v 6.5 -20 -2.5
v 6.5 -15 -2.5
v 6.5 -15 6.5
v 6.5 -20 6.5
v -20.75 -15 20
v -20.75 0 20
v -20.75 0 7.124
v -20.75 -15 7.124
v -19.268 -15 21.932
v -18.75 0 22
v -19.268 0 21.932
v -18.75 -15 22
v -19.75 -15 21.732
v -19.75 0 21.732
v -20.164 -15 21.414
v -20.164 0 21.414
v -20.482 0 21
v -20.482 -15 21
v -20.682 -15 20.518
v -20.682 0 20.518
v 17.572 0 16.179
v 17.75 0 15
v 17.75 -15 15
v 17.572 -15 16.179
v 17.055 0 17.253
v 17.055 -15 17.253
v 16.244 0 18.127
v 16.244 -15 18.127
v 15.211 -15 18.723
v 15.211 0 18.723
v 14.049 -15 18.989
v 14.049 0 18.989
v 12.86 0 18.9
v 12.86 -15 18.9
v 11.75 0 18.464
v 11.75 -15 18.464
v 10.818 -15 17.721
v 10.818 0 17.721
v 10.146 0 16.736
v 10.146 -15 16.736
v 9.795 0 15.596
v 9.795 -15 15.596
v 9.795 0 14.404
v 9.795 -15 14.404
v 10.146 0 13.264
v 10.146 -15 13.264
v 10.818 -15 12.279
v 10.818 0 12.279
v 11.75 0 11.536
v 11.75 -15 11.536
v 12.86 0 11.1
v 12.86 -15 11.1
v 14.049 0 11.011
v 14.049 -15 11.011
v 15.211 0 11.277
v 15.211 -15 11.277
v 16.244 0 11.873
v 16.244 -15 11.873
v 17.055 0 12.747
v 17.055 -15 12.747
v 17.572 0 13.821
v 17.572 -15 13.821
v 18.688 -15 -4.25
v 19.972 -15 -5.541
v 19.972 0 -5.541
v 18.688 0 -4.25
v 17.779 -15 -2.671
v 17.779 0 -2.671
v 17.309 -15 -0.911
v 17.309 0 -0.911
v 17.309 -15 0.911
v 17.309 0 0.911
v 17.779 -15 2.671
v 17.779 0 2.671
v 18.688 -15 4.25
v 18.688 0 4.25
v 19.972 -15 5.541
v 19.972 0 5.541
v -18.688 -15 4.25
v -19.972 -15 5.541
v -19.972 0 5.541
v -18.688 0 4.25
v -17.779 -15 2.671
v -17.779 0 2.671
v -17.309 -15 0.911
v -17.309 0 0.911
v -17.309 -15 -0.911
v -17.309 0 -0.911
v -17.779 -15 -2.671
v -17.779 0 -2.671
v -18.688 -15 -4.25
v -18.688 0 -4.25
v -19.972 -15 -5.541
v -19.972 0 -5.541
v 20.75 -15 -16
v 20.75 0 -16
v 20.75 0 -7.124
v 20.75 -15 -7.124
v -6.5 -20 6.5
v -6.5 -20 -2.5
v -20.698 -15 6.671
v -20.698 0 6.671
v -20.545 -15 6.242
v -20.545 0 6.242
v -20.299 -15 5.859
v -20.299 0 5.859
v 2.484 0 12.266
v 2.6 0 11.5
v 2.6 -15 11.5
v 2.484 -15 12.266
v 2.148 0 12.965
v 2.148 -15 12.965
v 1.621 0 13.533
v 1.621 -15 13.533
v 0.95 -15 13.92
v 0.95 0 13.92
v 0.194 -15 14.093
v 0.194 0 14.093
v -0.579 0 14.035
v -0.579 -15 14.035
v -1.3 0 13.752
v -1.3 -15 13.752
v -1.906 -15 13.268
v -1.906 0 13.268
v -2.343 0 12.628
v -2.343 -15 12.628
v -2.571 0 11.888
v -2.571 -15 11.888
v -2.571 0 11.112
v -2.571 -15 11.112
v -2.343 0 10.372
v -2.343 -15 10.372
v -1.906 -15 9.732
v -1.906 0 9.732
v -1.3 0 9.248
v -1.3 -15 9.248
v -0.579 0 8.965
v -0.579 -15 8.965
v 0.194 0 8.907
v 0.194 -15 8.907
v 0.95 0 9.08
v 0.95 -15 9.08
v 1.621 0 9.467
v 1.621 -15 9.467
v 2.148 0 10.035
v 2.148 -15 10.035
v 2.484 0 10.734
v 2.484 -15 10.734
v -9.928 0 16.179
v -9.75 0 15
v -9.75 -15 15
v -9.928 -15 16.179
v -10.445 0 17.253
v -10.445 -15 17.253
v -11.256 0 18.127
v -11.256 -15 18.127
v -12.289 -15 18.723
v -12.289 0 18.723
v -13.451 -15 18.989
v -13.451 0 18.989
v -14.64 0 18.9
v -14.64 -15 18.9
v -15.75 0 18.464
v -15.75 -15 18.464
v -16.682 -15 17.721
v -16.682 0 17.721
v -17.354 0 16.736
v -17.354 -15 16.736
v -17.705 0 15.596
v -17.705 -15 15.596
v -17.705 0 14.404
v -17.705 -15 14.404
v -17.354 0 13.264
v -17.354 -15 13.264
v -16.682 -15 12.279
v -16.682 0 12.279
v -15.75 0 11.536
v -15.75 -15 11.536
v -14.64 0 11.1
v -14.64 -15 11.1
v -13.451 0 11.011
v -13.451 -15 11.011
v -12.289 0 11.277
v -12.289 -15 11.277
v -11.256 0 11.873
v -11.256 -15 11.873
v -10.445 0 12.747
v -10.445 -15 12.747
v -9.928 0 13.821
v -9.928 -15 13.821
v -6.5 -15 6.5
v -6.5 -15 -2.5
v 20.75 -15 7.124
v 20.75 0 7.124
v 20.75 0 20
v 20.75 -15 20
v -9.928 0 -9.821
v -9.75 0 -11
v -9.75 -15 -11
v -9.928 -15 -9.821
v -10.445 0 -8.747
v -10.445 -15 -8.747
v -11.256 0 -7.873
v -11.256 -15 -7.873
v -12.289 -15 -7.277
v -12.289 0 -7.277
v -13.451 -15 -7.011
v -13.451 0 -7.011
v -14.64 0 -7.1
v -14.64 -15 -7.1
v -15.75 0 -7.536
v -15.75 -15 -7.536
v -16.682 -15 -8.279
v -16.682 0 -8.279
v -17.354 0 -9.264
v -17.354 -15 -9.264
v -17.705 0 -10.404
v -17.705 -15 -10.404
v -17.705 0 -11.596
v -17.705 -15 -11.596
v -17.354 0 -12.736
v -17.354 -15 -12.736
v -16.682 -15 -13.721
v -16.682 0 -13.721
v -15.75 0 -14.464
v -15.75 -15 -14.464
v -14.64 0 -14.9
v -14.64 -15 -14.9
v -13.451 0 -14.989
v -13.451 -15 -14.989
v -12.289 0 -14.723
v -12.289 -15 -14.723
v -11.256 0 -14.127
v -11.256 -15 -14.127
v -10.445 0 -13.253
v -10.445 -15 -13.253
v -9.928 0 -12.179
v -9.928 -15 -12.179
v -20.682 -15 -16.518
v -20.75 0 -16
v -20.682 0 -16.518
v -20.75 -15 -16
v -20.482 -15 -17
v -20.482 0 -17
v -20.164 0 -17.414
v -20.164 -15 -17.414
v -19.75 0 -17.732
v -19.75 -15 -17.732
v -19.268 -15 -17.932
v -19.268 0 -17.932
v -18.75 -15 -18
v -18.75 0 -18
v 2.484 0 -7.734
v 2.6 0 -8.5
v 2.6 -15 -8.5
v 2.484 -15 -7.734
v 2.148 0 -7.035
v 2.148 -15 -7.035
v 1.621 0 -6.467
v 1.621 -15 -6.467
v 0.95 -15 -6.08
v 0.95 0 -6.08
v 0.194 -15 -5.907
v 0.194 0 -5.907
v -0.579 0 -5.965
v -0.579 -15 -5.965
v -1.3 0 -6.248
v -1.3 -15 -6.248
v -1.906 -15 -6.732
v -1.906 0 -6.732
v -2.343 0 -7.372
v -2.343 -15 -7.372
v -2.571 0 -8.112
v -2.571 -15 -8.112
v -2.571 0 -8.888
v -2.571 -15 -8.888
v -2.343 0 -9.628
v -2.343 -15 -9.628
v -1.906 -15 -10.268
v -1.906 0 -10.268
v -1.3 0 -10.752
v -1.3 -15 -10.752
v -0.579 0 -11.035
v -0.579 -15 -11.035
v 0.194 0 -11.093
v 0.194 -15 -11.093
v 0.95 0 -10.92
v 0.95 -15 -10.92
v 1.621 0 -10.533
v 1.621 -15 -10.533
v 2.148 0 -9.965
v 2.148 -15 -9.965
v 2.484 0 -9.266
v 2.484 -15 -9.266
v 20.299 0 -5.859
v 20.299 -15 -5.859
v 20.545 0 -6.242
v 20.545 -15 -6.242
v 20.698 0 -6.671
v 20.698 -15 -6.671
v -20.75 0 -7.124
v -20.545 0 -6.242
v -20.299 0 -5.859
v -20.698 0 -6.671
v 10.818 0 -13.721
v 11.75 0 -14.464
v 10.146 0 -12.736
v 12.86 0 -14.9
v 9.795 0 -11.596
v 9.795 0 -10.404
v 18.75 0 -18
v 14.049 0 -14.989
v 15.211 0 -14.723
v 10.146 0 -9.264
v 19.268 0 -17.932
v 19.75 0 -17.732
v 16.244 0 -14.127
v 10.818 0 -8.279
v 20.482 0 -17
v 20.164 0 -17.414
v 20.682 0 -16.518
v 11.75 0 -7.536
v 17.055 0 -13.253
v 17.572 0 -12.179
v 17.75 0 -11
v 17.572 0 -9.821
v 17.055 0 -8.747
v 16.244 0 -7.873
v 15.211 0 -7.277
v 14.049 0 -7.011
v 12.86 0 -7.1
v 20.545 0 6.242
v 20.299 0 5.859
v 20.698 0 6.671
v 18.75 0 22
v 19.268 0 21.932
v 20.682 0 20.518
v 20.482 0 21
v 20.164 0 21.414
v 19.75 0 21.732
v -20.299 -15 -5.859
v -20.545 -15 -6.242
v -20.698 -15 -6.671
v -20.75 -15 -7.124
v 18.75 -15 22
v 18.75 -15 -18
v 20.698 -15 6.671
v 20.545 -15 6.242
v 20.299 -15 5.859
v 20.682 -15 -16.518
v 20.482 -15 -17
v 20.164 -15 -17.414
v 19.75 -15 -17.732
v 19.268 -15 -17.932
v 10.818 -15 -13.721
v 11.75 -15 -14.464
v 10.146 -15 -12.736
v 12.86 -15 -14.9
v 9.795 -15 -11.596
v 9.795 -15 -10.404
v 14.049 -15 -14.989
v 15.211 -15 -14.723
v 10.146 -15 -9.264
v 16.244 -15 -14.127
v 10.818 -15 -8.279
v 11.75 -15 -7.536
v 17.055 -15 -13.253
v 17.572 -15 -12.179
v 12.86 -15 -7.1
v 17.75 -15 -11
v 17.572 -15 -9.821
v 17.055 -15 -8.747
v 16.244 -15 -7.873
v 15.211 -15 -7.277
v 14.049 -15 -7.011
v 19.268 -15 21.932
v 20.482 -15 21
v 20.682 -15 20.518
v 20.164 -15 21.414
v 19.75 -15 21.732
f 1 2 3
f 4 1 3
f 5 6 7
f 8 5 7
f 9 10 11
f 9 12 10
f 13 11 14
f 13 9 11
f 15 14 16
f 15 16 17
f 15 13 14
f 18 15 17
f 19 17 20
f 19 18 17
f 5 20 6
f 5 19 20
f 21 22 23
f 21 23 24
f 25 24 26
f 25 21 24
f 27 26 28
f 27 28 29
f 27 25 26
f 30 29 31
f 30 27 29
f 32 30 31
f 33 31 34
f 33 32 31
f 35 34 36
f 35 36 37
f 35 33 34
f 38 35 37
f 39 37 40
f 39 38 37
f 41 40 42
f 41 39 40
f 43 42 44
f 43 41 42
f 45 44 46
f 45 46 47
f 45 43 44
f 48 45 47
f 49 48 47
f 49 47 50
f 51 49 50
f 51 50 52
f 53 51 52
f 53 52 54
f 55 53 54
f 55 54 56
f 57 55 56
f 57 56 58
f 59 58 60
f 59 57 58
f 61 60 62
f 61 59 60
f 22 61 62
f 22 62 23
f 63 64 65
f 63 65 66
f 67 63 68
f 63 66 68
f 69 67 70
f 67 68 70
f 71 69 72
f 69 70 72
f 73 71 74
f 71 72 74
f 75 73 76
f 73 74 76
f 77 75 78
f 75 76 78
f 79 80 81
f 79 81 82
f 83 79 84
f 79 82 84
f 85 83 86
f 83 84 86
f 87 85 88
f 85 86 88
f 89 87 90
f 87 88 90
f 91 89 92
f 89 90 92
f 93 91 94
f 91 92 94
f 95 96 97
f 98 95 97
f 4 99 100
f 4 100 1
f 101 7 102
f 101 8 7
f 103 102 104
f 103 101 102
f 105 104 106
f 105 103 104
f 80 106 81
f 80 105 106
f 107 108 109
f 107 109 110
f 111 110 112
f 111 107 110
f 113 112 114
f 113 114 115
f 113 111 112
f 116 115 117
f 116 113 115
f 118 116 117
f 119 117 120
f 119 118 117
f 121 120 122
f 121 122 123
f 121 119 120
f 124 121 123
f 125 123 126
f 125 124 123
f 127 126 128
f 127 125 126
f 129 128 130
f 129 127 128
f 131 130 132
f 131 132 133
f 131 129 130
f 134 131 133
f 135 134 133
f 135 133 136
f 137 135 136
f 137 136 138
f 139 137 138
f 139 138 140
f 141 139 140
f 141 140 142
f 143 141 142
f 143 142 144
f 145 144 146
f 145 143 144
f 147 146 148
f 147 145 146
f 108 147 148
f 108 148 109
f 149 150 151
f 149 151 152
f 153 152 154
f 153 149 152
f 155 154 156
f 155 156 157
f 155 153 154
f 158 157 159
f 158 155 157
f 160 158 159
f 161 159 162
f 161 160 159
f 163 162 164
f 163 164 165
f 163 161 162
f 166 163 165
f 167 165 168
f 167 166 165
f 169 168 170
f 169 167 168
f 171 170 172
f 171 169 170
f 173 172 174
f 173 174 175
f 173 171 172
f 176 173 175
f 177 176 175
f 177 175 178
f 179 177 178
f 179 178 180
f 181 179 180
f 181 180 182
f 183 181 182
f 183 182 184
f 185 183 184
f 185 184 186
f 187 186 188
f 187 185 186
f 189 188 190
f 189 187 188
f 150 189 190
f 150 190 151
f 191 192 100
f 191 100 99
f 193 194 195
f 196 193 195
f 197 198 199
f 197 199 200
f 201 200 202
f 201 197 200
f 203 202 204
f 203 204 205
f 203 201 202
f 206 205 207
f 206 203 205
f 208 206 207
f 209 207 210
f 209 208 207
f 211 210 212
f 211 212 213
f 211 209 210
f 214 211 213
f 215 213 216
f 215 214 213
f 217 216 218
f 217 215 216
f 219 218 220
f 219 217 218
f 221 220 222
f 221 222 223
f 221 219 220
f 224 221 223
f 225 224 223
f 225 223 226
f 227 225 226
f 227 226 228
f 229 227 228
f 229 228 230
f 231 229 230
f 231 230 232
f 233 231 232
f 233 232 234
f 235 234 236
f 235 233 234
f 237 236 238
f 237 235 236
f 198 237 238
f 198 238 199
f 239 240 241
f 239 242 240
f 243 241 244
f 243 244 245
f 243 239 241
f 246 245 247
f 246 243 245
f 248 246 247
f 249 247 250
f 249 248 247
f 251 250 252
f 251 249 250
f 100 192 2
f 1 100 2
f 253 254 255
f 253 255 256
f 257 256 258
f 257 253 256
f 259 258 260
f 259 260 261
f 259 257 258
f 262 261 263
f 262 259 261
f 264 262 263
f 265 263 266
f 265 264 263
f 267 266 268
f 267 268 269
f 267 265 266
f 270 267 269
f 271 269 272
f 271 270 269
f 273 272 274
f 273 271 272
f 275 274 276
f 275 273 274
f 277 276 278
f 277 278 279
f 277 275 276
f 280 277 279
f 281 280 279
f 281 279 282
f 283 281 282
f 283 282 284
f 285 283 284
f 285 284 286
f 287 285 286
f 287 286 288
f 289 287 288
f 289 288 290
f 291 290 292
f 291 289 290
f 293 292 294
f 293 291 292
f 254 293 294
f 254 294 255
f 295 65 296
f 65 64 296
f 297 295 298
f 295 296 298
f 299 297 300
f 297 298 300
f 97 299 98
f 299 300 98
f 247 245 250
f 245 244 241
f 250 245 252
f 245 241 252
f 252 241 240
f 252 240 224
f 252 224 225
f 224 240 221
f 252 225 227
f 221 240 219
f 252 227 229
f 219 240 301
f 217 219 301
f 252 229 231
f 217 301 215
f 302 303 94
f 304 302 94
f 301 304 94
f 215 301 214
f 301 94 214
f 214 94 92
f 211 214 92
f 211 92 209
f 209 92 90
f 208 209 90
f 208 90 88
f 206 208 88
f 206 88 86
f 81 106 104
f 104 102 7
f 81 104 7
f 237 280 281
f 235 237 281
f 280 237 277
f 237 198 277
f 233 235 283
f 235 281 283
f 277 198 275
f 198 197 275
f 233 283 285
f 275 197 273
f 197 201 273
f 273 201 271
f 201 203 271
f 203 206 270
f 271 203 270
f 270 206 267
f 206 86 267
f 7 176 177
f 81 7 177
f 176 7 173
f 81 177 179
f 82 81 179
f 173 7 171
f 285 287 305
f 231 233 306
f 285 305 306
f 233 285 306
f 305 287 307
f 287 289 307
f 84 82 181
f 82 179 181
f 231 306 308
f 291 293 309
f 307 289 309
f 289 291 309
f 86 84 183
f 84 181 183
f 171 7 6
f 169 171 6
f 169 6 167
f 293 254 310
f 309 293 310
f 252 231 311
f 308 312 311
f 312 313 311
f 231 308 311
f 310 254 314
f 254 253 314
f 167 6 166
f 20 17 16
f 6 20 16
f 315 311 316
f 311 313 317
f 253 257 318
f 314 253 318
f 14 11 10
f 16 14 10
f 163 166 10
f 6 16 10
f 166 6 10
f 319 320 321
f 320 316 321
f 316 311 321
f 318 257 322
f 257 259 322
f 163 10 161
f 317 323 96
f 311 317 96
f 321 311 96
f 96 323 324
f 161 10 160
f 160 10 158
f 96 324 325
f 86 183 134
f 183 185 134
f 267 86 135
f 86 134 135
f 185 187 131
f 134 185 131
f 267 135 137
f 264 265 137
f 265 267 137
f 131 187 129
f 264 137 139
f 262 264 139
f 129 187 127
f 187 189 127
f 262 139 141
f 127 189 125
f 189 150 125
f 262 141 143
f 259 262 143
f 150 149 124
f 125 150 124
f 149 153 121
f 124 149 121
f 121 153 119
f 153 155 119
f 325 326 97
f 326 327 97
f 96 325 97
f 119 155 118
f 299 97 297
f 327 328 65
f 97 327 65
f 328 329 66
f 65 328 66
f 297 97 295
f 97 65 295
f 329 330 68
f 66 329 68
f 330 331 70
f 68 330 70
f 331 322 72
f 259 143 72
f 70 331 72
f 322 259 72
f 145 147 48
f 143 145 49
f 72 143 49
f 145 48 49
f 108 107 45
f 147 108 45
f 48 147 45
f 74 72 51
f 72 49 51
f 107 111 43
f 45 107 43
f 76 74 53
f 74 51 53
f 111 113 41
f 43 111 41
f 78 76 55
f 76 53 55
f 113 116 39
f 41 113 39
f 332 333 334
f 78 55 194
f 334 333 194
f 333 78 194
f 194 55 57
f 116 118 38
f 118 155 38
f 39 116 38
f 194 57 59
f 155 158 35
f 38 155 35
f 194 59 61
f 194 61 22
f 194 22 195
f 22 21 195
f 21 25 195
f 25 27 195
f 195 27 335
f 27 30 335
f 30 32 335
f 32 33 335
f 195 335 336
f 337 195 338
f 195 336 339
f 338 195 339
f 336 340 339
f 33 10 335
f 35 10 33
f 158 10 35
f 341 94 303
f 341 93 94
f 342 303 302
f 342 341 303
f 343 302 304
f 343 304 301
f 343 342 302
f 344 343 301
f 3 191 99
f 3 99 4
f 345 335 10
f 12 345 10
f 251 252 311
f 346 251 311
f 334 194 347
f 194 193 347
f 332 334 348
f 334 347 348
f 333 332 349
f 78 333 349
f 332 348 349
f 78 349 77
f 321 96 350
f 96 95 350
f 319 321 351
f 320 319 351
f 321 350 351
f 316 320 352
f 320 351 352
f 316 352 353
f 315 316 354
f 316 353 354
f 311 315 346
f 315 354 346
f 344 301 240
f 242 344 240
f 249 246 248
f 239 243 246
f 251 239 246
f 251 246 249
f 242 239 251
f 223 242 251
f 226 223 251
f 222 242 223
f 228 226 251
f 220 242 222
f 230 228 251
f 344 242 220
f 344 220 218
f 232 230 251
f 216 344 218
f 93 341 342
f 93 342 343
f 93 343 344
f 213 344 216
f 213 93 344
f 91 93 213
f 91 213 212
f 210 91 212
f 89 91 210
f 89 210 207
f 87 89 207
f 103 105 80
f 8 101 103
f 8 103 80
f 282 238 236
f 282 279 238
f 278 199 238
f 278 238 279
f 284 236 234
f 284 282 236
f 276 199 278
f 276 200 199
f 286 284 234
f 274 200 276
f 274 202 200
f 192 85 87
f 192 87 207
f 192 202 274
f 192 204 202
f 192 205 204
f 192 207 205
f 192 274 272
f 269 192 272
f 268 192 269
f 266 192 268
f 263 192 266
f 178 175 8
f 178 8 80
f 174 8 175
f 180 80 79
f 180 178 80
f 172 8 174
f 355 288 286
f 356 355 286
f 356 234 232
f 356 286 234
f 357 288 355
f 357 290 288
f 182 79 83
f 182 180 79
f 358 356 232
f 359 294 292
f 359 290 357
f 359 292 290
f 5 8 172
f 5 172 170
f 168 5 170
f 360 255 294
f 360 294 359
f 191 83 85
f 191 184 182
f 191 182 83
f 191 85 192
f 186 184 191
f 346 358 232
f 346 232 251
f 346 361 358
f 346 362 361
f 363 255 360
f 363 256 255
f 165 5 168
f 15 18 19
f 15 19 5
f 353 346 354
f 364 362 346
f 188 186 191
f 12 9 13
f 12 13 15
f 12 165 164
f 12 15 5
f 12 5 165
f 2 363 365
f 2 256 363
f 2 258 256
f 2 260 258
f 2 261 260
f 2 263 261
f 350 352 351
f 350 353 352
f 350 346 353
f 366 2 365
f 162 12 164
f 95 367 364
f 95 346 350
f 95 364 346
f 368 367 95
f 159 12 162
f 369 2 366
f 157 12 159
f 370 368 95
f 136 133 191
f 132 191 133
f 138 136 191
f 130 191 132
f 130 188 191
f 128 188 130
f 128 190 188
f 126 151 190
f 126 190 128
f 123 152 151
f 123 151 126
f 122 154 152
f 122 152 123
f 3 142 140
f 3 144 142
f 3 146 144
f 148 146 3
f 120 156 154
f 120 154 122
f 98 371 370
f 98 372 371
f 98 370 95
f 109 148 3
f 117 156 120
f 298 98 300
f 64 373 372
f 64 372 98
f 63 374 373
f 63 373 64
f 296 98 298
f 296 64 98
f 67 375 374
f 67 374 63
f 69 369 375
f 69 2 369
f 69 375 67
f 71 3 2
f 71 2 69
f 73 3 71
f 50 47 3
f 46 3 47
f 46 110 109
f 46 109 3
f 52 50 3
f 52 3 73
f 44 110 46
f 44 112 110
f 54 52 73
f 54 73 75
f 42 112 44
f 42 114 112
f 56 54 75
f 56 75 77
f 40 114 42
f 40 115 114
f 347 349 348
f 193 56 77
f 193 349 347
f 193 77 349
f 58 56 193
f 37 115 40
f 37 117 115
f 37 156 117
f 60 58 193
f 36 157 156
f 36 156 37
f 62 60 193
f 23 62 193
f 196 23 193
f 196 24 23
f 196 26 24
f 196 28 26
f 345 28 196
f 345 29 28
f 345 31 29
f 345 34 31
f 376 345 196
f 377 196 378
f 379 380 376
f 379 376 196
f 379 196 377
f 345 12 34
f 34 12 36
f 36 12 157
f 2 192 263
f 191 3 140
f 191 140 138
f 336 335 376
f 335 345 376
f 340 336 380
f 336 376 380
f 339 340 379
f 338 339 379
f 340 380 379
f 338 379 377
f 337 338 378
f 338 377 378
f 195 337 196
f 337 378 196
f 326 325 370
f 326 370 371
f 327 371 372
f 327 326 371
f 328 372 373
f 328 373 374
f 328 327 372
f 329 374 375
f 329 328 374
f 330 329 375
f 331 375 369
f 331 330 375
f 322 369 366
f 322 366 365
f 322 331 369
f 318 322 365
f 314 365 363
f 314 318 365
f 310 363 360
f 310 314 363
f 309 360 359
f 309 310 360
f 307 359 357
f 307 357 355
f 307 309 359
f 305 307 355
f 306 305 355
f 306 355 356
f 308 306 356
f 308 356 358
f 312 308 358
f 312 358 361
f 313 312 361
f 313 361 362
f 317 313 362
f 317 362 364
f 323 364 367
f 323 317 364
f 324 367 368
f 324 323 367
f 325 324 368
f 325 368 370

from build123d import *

# Parameters (mm, degrees)
F0_R     = 4
F0_R_2   = 2.6
F1_DEPTH = 15
F2_R     = 2
F3_W     = 13
F3_H     = 9
F4_DEPTH = 5


with BuildPart() as f1:
    # F0 (on Front) → F1 (new body)
    with BuildSketch(Plane.XZ):
        with BuildLine():
            Line((20.75, 22), (-20.75, 22))
            Line((-20.75, 22), (-20.75, 6.062178))
            ThreePointArc((-20.75, 6.062178), (-17.25, 0), (-20.75, -6.062178))
            Line((-20.75, -6.062178), (-20.75, -18))
            Line((-20.75, -18), (20.75, -18))
            Line((20.75, -18), (20.75, -6.062178))
            ThreePointArc((20.75, -6.062178), (17.25, 0), (20.75, 6.062178))
            Line((20.75, 6.062178), (20.75, 22))
        make_face()
        with Locations((-13.75, -11)):
            Circle(F0_R, mode=Mode.SUBTRACT)
        with Locations((0, -8.5)):
            Circle(F0_R_2, mode=Mode.SUBTRACT)
        with Locations((13.75, -11)):
            Circle(F0_R, mode=Mode.SUBTRACT)
        with Locations((-13.75, 15)):
            Circle(F0_R, mode=Mode.SUBTRACT)
        with Locations((0, 11.5)):
            Circle(F0_R_2, mode=Mode.SUBTRACT)
        with Locations((13.75, 15)):
            Circle(F0_R, mode=Mode.SUBTRACT)
    extrude(amount=F1_DEPTH)

    # F2
    f2_edges = [f1.edges().sort_by_distance(p)[0] for p in [
        (-20.75, -7.5, 22),
        (20.75, -7.5, 22),
        (-20.75, -7.5, -18),
        (20.75, -7.5, -18),
        (20.75, -7.5, 6.062178),
        (20.75, -7.5, -6.062178),
        (-20.75, -7.5, 6.062178),
        (-20.75, -7.5, -6.062178),
    ]]
    fillet(f2_edges, radius=F2_R)

    # F3 (on face) → F4 (join)
    with BuildSketch(Plane.XZ.offset(15)):
        with Locations((0, 2)):
            Rectangle(F3_W, F3_H)
    extrude(amount=F4_DEPTH)


solid = f1.part
